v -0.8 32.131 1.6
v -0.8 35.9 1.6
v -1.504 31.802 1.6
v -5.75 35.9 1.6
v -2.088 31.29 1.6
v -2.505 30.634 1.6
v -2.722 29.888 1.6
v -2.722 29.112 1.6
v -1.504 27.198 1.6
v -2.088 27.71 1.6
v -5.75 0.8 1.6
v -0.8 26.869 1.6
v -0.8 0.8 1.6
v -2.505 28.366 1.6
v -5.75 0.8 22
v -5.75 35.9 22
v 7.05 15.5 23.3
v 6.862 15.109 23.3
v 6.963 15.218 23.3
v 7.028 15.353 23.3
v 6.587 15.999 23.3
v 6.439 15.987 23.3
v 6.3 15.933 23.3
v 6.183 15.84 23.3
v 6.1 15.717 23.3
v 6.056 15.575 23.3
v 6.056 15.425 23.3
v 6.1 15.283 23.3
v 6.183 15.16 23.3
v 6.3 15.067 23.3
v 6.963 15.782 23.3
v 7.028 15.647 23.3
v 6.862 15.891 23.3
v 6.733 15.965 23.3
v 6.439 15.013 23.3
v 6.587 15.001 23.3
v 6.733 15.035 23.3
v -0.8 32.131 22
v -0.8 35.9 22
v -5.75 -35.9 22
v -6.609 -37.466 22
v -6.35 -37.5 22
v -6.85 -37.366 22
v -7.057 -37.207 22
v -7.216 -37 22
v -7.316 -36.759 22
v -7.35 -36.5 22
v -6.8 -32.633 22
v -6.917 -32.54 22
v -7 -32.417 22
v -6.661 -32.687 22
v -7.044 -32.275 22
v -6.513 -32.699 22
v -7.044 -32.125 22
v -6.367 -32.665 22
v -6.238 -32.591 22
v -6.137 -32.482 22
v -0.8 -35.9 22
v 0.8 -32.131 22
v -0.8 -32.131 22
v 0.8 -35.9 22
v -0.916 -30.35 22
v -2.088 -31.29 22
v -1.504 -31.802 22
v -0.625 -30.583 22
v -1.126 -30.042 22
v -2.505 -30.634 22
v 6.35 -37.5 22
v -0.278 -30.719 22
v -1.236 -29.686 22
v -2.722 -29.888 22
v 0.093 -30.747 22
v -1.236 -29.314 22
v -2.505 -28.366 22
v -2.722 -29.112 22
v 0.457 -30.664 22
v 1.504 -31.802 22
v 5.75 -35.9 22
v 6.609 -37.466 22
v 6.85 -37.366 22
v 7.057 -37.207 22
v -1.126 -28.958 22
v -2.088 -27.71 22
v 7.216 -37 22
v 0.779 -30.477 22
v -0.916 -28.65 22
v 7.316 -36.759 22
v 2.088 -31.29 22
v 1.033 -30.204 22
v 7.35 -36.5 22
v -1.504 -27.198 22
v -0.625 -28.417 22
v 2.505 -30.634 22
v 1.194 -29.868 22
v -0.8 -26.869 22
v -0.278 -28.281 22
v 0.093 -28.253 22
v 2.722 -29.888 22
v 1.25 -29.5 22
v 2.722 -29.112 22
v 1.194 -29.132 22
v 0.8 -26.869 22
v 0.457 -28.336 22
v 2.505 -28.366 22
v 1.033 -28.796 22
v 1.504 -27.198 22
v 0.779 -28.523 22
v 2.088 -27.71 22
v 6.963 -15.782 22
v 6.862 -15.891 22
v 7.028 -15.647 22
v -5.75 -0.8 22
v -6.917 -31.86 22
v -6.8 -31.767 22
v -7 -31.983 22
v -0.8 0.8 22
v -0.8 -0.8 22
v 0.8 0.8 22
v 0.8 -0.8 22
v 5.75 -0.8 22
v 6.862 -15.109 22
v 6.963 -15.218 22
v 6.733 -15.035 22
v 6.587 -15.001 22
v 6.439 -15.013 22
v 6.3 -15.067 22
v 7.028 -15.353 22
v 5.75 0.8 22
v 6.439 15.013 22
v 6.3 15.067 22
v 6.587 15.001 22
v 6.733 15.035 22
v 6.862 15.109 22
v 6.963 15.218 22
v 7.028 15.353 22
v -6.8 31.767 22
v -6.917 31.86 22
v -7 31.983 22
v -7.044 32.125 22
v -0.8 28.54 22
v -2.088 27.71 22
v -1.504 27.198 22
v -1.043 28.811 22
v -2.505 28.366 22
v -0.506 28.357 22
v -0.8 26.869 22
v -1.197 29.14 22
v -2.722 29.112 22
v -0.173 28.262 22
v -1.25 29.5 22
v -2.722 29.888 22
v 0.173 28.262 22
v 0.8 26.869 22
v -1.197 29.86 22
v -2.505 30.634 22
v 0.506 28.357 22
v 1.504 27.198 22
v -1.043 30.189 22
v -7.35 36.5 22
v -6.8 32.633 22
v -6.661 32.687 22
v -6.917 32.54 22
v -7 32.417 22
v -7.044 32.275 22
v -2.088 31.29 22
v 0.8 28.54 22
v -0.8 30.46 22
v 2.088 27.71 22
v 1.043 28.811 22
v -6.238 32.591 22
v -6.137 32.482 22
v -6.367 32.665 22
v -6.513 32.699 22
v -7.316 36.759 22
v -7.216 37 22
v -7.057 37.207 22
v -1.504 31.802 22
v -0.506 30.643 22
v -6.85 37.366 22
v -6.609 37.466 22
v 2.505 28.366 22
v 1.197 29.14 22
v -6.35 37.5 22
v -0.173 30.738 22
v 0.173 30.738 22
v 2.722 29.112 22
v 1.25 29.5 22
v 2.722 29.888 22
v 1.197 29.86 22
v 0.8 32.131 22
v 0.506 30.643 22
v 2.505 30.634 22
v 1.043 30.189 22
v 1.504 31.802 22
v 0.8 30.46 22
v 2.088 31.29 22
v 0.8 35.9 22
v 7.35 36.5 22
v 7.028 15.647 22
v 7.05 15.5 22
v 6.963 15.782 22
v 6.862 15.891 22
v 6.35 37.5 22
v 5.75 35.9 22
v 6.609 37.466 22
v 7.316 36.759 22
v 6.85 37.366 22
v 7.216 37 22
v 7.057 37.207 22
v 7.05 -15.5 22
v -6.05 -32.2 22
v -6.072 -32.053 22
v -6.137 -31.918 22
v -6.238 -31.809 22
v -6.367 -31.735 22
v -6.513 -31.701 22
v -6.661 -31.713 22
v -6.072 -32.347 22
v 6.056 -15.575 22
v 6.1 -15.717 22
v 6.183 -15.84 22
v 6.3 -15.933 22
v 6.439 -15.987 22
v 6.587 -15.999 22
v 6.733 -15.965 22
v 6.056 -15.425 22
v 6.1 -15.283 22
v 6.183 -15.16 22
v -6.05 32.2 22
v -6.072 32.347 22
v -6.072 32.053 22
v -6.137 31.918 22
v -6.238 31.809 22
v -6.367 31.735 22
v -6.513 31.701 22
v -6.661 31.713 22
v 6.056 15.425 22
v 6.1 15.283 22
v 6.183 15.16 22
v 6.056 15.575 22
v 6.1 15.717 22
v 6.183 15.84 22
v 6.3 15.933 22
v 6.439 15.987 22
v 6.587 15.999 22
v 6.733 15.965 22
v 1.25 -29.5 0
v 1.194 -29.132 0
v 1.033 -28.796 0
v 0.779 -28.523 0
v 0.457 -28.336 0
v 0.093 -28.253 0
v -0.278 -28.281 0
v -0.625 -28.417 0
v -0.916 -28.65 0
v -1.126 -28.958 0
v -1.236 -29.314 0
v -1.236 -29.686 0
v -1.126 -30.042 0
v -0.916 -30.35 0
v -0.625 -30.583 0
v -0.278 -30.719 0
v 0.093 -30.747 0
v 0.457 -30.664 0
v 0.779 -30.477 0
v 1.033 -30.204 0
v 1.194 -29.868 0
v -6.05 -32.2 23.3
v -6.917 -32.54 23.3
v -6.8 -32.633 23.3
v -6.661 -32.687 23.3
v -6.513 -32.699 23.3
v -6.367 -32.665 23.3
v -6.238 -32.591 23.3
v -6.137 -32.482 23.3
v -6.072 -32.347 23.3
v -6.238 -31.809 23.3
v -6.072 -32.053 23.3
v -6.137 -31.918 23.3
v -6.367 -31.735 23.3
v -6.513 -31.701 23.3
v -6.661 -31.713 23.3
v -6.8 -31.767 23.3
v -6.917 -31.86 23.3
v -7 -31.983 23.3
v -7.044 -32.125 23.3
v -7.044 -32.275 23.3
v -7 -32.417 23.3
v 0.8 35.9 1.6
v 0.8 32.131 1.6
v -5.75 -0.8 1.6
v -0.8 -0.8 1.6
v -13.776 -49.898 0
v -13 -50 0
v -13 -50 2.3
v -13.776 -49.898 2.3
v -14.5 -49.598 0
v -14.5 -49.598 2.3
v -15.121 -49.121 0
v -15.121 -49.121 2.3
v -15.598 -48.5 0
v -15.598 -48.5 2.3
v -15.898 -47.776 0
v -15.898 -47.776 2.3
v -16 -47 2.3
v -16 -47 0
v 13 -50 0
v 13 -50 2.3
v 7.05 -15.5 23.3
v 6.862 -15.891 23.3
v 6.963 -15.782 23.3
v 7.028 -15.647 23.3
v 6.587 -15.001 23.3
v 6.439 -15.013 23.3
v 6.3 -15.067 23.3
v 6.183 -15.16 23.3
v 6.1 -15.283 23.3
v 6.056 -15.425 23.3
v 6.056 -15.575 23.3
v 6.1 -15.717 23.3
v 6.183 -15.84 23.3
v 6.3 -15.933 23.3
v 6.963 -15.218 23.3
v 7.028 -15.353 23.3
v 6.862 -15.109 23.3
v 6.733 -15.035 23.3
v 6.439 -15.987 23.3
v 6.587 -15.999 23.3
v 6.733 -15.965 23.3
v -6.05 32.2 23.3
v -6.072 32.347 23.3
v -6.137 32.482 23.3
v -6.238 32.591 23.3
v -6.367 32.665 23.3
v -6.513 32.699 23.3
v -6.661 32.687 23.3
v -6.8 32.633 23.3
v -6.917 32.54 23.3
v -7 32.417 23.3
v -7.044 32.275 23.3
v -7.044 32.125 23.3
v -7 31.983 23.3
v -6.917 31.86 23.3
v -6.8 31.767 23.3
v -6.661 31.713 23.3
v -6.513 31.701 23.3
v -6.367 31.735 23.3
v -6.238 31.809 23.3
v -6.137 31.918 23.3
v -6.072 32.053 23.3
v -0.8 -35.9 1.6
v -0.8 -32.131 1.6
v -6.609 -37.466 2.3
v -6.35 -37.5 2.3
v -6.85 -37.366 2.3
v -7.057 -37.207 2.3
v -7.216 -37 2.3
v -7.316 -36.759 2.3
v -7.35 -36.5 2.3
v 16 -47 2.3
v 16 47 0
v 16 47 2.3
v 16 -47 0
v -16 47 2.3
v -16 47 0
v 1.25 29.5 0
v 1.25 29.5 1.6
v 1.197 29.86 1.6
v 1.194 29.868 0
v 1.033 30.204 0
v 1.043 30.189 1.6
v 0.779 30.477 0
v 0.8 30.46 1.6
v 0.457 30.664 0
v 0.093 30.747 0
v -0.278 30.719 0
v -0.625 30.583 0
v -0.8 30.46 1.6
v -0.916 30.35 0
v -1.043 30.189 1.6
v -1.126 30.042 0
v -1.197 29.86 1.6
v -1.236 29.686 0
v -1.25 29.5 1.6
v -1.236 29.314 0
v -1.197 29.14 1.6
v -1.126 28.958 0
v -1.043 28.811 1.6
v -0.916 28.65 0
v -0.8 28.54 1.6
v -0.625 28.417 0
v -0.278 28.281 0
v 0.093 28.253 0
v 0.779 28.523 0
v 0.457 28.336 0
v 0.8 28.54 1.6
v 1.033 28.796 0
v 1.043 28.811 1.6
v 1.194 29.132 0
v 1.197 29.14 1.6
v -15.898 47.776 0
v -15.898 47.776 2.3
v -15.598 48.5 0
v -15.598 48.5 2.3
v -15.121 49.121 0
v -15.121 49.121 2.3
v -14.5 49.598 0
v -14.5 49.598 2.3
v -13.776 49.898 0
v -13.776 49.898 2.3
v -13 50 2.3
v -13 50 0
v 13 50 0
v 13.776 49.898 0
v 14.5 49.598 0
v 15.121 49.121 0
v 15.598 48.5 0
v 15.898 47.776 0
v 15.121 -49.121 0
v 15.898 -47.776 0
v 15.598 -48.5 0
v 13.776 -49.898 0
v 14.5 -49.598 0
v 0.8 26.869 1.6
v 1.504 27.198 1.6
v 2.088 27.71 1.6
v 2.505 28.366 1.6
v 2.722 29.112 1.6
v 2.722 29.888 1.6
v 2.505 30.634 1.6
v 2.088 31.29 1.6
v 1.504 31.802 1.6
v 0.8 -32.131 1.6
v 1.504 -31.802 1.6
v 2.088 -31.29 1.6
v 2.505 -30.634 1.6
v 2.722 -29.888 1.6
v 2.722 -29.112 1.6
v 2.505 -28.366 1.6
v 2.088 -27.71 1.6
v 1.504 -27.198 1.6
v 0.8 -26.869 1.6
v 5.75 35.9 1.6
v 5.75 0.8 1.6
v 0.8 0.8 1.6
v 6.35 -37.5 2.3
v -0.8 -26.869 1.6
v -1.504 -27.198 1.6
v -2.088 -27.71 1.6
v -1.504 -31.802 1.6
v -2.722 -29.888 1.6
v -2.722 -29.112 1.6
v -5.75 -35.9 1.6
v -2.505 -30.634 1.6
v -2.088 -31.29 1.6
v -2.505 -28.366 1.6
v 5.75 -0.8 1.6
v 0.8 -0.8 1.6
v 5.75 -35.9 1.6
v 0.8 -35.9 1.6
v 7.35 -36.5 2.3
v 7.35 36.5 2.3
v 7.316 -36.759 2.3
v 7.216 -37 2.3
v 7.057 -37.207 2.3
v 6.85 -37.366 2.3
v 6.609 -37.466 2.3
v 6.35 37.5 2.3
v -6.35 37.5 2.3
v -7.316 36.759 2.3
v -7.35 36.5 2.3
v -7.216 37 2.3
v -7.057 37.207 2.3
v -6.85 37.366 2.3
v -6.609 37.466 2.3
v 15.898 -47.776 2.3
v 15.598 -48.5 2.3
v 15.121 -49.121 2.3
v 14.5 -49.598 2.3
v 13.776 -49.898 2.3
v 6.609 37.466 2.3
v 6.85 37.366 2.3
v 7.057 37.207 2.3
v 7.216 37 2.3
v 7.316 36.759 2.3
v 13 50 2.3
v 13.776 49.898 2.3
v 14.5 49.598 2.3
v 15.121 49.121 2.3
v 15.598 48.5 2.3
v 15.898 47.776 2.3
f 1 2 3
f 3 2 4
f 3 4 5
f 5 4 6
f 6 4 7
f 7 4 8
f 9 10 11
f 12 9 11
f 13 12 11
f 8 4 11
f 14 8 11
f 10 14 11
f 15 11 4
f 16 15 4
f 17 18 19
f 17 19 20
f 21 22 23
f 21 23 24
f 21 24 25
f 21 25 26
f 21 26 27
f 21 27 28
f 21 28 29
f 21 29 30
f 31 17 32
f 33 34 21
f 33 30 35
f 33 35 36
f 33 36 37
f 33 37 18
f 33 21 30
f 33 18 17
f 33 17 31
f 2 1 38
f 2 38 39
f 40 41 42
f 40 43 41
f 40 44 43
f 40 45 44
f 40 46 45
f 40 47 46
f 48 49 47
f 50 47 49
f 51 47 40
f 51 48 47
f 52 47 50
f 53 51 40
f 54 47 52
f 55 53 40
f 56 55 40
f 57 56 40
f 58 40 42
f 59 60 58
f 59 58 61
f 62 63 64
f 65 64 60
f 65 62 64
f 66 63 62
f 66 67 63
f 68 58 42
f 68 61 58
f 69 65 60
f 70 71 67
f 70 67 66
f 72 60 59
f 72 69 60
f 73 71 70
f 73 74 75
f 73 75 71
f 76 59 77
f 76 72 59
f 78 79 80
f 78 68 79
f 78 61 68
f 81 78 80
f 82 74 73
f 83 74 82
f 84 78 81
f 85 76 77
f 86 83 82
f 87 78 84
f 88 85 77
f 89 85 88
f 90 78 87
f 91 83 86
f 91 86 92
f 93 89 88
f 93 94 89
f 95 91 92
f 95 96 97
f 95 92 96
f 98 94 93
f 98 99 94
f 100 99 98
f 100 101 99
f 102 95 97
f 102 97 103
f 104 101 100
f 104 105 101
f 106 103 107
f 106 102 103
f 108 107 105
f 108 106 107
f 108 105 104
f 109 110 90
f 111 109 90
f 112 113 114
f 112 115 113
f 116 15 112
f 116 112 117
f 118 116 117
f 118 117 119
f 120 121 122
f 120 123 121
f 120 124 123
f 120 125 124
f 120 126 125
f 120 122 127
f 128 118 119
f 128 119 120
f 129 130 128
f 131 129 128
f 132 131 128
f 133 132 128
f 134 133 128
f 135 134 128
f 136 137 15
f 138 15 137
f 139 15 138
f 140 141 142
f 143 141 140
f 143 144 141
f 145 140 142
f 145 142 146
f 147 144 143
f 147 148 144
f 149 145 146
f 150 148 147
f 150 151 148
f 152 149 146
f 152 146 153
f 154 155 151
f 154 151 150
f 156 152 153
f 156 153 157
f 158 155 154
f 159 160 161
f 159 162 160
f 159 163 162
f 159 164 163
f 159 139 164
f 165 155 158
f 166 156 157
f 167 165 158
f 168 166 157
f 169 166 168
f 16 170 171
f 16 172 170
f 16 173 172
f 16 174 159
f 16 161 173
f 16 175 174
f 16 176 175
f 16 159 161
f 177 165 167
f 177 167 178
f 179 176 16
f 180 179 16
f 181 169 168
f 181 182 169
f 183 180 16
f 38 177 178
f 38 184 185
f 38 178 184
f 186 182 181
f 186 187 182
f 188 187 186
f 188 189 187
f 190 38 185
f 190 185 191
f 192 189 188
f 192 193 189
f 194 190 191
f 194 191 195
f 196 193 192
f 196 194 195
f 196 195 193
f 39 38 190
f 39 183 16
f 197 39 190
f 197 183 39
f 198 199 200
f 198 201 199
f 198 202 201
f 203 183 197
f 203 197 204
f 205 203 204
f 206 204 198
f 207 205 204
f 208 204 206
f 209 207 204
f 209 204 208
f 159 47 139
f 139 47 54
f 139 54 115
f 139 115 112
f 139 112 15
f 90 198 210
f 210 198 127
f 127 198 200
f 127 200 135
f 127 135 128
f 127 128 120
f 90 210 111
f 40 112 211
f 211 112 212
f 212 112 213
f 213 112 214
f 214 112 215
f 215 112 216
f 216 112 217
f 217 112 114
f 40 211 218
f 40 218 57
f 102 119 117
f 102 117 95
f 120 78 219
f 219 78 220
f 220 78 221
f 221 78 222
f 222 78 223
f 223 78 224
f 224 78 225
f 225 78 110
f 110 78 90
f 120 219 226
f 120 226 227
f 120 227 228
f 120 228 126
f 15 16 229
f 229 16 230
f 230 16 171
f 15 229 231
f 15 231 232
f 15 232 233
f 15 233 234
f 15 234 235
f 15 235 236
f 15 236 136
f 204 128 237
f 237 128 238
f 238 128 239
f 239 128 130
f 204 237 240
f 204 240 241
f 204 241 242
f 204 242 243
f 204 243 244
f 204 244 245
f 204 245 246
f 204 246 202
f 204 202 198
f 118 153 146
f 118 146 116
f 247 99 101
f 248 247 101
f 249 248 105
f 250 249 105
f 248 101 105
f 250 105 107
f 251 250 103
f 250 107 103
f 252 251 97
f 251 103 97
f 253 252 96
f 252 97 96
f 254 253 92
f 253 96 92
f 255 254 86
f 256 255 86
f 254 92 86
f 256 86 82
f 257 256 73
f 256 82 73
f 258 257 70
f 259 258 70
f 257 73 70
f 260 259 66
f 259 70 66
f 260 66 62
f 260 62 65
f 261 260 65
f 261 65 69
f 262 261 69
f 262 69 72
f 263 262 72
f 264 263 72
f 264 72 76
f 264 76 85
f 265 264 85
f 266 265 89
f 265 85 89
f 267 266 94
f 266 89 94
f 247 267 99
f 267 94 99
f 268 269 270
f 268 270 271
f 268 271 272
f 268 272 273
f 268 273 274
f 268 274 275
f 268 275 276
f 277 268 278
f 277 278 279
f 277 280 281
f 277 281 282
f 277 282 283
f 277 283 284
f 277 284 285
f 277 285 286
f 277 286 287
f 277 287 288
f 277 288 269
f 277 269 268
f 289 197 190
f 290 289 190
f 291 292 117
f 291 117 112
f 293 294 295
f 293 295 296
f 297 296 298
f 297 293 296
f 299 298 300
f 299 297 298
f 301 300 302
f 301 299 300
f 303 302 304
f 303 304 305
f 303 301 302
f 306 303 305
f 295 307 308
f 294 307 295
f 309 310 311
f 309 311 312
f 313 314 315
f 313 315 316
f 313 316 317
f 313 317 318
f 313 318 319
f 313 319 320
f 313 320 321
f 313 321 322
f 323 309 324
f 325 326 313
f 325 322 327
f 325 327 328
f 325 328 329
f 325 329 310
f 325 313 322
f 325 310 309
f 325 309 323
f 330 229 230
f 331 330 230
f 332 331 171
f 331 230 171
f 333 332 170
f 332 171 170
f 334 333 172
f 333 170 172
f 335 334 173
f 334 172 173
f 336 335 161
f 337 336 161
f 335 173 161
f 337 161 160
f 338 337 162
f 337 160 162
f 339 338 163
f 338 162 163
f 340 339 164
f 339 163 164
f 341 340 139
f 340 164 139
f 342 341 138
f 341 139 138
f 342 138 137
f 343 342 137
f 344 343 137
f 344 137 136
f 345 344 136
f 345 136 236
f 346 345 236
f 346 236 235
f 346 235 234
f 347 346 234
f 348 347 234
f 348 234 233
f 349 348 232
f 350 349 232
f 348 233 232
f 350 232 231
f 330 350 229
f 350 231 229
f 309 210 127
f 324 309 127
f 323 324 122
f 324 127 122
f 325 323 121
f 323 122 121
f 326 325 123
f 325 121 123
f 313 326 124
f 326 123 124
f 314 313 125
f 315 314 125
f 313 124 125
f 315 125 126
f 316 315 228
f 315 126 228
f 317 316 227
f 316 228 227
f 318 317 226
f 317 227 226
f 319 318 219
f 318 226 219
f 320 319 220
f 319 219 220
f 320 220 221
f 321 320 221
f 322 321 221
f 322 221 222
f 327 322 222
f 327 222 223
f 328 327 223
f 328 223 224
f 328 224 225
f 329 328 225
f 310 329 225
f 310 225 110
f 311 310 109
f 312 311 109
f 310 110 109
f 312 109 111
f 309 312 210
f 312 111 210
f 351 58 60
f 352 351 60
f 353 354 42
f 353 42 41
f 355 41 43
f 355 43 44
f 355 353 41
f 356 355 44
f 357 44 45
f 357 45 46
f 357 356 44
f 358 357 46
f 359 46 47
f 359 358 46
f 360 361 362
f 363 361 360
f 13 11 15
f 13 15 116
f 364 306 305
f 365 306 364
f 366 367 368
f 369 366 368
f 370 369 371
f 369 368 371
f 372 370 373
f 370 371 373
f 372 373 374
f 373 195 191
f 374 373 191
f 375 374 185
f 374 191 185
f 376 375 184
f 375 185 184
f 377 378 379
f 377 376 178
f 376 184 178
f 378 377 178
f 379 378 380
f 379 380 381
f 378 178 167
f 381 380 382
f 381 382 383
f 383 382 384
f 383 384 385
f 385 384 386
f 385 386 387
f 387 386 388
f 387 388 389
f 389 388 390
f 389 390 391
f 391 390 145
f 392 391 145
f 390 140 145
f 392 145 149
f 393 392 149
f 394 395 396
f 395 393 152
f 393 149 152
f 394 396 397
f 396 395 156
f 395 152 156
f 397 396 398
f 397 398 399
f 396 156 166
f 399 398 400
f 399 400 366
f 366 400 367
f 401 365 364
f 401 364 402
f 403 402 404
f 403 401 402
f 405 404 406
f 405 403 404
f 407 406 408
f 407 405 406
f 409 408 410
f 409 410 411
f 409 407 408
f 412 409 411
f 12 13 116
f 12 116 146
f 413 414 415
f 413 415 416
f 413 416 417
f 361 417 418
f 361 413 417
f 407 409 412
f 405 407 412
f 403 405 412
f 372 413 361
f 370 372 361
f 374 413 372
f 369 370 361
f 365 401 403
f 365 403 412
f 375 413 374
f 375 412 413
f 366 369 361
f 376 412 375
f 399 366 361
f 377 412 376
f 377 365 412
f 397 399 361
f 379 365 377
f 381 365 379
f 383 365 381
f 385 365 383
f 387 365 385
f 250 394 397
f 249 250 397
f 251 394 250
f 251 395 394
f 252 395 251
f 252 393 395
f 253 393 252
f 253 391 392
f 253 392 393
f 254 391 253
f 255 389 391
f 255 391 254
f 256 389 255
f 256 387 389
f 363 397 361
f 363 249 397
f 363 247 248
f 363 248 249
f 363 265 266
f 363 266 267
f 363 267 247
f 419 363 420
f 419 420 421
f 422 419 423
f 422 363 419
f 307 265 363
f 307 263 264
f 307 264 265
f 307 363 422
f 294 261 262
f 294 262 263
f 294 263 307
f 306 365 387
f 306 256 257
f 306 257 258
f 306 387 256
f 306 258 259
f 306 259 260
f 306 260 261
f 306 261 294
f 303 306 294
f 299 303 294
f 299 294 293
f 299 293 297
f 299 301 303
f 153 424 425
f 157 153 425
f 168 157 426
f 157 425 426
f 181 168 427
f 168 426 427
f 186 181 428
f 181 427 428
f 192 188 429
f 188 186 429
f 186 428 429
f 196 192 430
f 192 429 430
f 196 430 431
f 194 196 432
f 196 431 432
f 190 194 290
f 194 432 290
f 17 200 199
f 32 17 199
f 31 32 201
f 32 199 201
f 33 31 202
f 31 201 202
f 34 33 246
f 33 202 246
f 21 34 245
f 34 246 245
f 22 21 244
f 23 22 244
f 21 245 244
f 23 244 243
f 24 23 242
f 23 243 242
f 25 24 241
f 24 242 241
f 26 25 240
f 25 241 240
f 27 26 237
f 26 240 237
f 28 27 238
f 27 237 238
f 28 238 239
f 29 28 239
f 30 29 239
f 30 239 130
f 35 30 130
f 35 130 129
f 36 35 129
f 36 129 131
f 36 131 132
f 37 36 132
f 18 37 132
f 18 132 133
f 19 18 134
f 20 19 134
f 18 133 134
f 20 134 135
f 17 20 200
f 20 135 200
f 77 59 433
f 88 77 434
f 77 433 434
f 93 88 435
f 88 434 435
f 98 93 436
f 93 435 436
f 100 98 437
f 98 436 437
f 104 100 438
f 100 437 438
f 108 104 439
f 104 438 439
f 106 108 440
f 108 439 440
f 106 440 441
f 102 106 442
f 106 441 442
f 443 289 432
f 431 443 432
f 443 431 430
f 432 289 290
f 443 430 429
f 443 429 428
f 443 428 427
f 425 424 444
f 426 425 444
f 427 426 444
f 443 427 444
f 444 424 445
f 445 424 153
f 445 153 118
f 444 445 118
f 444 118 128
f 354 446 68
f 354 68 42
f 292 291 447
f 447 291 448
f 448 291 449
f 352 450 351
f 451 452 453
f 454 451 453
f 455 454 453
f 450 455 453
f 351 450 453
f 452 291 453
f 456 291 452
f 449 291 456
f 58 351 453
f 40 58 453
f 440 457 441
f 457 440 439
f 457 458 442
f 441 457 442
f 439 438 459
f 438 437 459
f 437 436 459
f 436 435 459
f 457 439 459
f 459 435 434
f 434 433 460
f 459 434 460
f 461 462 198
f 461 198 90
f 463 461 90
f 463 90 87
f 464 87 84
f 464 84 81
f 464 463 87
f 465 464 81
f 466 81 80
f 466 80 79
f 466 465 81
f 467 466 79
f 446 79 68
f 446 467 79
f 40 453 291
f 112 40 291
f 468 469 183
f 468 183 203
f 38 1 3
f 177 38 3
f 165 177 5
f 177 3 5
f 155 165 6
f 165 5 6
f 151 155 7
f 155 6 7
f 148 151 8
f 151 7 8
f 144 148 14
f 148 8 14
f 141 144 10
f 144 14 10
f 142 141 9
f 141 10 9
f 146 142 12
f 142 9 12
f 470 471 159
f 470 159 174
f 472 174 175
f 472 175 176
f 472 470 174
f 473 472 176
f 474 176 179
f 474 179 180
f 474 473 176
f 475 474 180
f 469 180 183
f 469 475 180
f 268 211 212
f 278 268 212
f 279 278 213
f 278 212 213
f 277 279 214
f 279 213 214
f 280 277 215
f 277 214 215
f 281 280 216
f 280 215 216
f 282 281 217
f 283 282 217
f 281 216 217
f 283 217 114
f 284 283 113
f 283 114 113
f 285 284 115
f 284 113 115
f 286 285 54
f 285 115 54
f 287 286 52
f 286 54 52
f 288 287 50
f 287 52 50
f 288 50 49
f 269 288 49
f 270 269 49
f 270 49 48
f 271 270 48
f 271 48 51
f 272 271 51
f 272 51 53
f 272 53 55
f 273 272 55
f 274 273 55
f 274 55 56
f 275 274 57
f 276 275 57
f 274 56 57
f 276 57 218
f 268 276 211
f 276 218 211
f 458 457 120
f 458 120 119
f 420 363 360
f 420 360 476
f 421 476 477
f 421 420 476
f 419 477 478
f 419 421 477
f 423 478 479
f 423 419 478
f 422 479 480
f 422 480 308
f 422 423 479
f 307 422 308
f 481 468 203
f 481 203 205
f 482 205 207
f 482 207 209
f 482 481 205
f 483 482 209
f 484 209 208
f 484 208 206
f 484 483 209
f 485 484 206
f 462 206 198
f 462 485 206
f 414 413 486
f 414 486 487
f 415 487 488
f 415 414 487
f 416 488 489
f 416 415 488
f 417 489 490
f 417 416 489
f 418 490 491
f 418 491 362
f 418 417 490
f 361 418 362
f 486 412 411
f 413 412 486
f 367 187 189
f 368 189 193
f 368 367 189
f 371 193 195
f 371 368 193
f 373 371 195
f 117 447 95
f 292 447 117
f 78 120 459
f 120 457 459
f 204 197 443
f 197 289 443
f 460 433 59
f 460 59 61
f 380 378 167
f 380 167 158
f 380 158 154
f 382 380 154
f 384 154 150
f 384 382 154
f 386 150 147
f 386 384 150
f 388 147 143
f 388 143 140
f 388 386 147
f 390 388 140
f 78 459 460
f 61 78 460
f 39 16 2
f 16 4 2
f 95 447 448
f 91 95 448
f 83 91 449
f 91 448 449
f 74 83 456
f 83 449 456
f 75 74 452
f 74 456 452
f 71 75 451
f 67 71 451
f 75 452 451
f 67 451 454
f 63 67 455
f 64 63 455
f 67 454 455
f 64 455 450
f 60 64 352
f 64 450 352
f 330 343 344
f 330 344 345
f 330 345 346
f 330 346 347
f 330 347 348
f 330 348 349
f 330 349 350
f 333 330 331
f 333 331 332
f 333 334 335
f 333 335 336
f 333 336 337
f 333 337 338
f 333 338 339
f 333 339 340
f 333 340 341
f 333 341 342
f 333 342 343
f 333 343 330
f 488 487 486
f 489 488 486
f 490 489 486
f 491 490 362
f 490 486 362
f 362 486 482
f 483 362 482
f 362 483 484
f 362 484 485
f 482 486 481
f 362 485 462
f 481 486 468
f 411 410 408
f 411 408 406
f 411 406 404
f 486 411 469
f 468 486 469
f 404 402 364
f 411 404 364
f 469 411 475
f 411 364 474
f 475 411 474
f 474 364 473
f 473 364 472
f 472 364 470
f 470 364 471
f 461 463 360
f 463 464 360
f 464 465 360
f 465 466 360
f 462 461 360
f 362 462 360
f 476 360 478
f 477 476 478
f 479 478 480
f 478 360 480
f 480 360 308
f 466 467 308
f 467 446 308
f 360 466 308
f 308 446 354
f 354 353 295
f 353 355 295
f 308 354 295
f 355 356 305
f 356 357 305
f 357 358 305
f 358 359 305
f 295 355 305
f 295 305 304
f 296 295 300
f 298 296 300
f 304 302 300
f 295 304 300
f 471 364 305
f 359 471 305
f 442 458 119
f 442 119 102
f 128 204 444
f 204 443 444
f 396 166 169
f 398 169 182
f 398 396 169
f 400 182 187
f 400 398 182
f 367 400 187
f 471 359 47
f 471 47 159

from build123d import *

# Parameters (mm, degrees)
EXTRUDE_2_DEPTH     = 22
EXTRUDE_3_DEPTH     = 2.3
SHELL_1_T           = -1.6
EXTRUDE_4_DEPTH     = 20.4
EXTRUDE_START       = -20.4
SKETCH_4_R          = 2.75
SKETCH_4_R_2        = 1.25
EXTRUDE_5_DEPTH     = 20.4
SKETCH_5_R          = 1.25
CUT_EXTRUDE_1_DEPTH = 22
SKETCH_6_R          = 0.5
EXTRUDE_6_DEPTH     = 1.3


with BuildPart() as part:
    # 스케치1 → 보스-돌출2 (new body)
    with BuildSketch(Plane(origin=(0, 0, 0), x_dir=(0, 1, 0), z_dir=(0, 0, 1))):
        with BuildLine():
            Line((-36.5, 7.35), (36.5, 7.35))
            ThreePointArc((36.5, 7.35), (37.207106781, 7.057106781), (37.5, 6.35))
            Line((37.5, 6.35), (37.5, -6.35))
            ThreePointArc((37.5, -6.35), (37.207106781, -7.057106781), (36.5, -7.35))
            Line((36.5, -7.35), (-36.5, -7.35))
            ThreePointArc((-36.5, -7.35), (-37.207106781, -7.057106781), (-37.5, -6.35))
            Line((-37.5, -6.35), (-37.5, 6.35))
            ThreePointArc((-37.5, 6.35), (-37.207106781, 7.057106781), (-36.5, 7.35))
        make_face()
    extrude(amount=EXTRUDE_2_DEPTH)

    # 스케치1<5> → 보스-돌출3 (add)
    with BuildSketch(Plane(origin=(0, 0, 0), x_dir=(0, 1, 0), z_dir=(0, 0, 1))):
        with BuildLine():
            Line((-47, 16), (47, 16))
            ThreePointArc((47, 16), (49.121320344, 15.121320344), (50, 13))
            Line((50, 13), (50, -13))
            ThreePointArc((50, -13), (49.121320344, -15.121320344), (47, -16))
            Line((47, -16), (-47, -16))
            ThreePointArc((-47, -16), (-49.121320344, -15.121320344), (-50, -13))
            Line((-50, -13), (-50, 13))
            ThreePointArc((-50, 13), (-49.121320344, 15.121320344), (-47, 16))
        make_face()
        with BuildLine():
            Line((-36.5, 7.35), (36.5, 7.35))
            ThreePointArc((36.5, 7.35), (37.207106781, 7.057106781), (37.5, 6.35))
            Line((37.5, 6.35), (37.5, -6.35))
            ThreePointArc((37.5, -6.35), (37.207106781, -7.057106781), (36.5, -7.35))
            Line((36.5, -7.35), (-36.5, -7.35))
            ThreePointArc((-36.5, -7.35), (-37.207106781, -7.057106781), (-37.5, -6.35))
            Line((-37.5, -6.35), (-37.5, 6.35))
            ThreePointArc((-37.5, 6.35), (-37.207106781, 7.057106781), (-36.5, 7.35))
        make_face(mode=Mode.SUBTRACT)
    extrude(amount=EXTRUDE_3_DEPTH)

    # 쉘1
    shell_1_openings = [part.faces().sort_by_distance(p)[0] for p in [
        (0, 0, 22),
    ]]
    offset(amount=SHELL_1_T, openings=shell_1_openings, kind=Kind.INTERSECTION)

    # 스케치3 → 보스-돌출4 (add)
    with BuildSketch(Plane.XY.offset(1.6)):
        Polygon((0.8, 35.9), (0.8, 0.8), (5.75, 0.8), (5.75, -0.8), (0.8, -0.8), (0.8, -35.9), (-0.8, -35.9), (-0.8, -0.8), (-5.75, -0.8), (-5.75, 0.8), (-0.8, 0.8), (-0.8, 35.9), align=None)
    extrude(amount=EXTRUDE_4_DEPTH)

    # 스케치4 → 보스-돌출5 (add)
    with BuildSketch(Plane.XY.offset(22).offset(EXTRUDE_START)):
        with Locations((0, 29.5)):
            Circle(SKETCH_4_R)
        with Locations((0, 29.5)):
            Circle(SKETCH_4_R_2, mode=Mode.SUBTRACT)
        with Locations((0, -29.5)):
            Circle(SKETCH_4_R)
    extrude(amount=EXTRUDE_5_DEPTH)

    # 스케치5 → 컷-돌출1 (cut)
    with BuildSketch(Plane.XY.offset(22)):
        with Locations((0, -29.5)):
            Circle(SKETCH_5_R)
        with Locations((0, 29.5)):
            Circle(SKETCH_5_R)
    extrude(amount=-CUT_EXTRUDE_1_DEPTH, mode=Mode.SUBTRACT)

    # 스케치6 → 보스-돌출6 (add)
    with BuildSketch(Plane.XY.offset(22)):
        with Locations((-6.55, -32.2)):
            Circle(SKETCH_6_R)
        with Locations((6.55, -15.5)):
            Circle(SKETCH_6_R)
        with Locations((-6.55, 32.2)):
            Circle(SKETCH_6_R)
        with Locations((6.55, 15.5)):
            Circle(SKETCH_6_R)
    extrude(amount=EXTRUDE_6_DEPTH)


solid = part.part
